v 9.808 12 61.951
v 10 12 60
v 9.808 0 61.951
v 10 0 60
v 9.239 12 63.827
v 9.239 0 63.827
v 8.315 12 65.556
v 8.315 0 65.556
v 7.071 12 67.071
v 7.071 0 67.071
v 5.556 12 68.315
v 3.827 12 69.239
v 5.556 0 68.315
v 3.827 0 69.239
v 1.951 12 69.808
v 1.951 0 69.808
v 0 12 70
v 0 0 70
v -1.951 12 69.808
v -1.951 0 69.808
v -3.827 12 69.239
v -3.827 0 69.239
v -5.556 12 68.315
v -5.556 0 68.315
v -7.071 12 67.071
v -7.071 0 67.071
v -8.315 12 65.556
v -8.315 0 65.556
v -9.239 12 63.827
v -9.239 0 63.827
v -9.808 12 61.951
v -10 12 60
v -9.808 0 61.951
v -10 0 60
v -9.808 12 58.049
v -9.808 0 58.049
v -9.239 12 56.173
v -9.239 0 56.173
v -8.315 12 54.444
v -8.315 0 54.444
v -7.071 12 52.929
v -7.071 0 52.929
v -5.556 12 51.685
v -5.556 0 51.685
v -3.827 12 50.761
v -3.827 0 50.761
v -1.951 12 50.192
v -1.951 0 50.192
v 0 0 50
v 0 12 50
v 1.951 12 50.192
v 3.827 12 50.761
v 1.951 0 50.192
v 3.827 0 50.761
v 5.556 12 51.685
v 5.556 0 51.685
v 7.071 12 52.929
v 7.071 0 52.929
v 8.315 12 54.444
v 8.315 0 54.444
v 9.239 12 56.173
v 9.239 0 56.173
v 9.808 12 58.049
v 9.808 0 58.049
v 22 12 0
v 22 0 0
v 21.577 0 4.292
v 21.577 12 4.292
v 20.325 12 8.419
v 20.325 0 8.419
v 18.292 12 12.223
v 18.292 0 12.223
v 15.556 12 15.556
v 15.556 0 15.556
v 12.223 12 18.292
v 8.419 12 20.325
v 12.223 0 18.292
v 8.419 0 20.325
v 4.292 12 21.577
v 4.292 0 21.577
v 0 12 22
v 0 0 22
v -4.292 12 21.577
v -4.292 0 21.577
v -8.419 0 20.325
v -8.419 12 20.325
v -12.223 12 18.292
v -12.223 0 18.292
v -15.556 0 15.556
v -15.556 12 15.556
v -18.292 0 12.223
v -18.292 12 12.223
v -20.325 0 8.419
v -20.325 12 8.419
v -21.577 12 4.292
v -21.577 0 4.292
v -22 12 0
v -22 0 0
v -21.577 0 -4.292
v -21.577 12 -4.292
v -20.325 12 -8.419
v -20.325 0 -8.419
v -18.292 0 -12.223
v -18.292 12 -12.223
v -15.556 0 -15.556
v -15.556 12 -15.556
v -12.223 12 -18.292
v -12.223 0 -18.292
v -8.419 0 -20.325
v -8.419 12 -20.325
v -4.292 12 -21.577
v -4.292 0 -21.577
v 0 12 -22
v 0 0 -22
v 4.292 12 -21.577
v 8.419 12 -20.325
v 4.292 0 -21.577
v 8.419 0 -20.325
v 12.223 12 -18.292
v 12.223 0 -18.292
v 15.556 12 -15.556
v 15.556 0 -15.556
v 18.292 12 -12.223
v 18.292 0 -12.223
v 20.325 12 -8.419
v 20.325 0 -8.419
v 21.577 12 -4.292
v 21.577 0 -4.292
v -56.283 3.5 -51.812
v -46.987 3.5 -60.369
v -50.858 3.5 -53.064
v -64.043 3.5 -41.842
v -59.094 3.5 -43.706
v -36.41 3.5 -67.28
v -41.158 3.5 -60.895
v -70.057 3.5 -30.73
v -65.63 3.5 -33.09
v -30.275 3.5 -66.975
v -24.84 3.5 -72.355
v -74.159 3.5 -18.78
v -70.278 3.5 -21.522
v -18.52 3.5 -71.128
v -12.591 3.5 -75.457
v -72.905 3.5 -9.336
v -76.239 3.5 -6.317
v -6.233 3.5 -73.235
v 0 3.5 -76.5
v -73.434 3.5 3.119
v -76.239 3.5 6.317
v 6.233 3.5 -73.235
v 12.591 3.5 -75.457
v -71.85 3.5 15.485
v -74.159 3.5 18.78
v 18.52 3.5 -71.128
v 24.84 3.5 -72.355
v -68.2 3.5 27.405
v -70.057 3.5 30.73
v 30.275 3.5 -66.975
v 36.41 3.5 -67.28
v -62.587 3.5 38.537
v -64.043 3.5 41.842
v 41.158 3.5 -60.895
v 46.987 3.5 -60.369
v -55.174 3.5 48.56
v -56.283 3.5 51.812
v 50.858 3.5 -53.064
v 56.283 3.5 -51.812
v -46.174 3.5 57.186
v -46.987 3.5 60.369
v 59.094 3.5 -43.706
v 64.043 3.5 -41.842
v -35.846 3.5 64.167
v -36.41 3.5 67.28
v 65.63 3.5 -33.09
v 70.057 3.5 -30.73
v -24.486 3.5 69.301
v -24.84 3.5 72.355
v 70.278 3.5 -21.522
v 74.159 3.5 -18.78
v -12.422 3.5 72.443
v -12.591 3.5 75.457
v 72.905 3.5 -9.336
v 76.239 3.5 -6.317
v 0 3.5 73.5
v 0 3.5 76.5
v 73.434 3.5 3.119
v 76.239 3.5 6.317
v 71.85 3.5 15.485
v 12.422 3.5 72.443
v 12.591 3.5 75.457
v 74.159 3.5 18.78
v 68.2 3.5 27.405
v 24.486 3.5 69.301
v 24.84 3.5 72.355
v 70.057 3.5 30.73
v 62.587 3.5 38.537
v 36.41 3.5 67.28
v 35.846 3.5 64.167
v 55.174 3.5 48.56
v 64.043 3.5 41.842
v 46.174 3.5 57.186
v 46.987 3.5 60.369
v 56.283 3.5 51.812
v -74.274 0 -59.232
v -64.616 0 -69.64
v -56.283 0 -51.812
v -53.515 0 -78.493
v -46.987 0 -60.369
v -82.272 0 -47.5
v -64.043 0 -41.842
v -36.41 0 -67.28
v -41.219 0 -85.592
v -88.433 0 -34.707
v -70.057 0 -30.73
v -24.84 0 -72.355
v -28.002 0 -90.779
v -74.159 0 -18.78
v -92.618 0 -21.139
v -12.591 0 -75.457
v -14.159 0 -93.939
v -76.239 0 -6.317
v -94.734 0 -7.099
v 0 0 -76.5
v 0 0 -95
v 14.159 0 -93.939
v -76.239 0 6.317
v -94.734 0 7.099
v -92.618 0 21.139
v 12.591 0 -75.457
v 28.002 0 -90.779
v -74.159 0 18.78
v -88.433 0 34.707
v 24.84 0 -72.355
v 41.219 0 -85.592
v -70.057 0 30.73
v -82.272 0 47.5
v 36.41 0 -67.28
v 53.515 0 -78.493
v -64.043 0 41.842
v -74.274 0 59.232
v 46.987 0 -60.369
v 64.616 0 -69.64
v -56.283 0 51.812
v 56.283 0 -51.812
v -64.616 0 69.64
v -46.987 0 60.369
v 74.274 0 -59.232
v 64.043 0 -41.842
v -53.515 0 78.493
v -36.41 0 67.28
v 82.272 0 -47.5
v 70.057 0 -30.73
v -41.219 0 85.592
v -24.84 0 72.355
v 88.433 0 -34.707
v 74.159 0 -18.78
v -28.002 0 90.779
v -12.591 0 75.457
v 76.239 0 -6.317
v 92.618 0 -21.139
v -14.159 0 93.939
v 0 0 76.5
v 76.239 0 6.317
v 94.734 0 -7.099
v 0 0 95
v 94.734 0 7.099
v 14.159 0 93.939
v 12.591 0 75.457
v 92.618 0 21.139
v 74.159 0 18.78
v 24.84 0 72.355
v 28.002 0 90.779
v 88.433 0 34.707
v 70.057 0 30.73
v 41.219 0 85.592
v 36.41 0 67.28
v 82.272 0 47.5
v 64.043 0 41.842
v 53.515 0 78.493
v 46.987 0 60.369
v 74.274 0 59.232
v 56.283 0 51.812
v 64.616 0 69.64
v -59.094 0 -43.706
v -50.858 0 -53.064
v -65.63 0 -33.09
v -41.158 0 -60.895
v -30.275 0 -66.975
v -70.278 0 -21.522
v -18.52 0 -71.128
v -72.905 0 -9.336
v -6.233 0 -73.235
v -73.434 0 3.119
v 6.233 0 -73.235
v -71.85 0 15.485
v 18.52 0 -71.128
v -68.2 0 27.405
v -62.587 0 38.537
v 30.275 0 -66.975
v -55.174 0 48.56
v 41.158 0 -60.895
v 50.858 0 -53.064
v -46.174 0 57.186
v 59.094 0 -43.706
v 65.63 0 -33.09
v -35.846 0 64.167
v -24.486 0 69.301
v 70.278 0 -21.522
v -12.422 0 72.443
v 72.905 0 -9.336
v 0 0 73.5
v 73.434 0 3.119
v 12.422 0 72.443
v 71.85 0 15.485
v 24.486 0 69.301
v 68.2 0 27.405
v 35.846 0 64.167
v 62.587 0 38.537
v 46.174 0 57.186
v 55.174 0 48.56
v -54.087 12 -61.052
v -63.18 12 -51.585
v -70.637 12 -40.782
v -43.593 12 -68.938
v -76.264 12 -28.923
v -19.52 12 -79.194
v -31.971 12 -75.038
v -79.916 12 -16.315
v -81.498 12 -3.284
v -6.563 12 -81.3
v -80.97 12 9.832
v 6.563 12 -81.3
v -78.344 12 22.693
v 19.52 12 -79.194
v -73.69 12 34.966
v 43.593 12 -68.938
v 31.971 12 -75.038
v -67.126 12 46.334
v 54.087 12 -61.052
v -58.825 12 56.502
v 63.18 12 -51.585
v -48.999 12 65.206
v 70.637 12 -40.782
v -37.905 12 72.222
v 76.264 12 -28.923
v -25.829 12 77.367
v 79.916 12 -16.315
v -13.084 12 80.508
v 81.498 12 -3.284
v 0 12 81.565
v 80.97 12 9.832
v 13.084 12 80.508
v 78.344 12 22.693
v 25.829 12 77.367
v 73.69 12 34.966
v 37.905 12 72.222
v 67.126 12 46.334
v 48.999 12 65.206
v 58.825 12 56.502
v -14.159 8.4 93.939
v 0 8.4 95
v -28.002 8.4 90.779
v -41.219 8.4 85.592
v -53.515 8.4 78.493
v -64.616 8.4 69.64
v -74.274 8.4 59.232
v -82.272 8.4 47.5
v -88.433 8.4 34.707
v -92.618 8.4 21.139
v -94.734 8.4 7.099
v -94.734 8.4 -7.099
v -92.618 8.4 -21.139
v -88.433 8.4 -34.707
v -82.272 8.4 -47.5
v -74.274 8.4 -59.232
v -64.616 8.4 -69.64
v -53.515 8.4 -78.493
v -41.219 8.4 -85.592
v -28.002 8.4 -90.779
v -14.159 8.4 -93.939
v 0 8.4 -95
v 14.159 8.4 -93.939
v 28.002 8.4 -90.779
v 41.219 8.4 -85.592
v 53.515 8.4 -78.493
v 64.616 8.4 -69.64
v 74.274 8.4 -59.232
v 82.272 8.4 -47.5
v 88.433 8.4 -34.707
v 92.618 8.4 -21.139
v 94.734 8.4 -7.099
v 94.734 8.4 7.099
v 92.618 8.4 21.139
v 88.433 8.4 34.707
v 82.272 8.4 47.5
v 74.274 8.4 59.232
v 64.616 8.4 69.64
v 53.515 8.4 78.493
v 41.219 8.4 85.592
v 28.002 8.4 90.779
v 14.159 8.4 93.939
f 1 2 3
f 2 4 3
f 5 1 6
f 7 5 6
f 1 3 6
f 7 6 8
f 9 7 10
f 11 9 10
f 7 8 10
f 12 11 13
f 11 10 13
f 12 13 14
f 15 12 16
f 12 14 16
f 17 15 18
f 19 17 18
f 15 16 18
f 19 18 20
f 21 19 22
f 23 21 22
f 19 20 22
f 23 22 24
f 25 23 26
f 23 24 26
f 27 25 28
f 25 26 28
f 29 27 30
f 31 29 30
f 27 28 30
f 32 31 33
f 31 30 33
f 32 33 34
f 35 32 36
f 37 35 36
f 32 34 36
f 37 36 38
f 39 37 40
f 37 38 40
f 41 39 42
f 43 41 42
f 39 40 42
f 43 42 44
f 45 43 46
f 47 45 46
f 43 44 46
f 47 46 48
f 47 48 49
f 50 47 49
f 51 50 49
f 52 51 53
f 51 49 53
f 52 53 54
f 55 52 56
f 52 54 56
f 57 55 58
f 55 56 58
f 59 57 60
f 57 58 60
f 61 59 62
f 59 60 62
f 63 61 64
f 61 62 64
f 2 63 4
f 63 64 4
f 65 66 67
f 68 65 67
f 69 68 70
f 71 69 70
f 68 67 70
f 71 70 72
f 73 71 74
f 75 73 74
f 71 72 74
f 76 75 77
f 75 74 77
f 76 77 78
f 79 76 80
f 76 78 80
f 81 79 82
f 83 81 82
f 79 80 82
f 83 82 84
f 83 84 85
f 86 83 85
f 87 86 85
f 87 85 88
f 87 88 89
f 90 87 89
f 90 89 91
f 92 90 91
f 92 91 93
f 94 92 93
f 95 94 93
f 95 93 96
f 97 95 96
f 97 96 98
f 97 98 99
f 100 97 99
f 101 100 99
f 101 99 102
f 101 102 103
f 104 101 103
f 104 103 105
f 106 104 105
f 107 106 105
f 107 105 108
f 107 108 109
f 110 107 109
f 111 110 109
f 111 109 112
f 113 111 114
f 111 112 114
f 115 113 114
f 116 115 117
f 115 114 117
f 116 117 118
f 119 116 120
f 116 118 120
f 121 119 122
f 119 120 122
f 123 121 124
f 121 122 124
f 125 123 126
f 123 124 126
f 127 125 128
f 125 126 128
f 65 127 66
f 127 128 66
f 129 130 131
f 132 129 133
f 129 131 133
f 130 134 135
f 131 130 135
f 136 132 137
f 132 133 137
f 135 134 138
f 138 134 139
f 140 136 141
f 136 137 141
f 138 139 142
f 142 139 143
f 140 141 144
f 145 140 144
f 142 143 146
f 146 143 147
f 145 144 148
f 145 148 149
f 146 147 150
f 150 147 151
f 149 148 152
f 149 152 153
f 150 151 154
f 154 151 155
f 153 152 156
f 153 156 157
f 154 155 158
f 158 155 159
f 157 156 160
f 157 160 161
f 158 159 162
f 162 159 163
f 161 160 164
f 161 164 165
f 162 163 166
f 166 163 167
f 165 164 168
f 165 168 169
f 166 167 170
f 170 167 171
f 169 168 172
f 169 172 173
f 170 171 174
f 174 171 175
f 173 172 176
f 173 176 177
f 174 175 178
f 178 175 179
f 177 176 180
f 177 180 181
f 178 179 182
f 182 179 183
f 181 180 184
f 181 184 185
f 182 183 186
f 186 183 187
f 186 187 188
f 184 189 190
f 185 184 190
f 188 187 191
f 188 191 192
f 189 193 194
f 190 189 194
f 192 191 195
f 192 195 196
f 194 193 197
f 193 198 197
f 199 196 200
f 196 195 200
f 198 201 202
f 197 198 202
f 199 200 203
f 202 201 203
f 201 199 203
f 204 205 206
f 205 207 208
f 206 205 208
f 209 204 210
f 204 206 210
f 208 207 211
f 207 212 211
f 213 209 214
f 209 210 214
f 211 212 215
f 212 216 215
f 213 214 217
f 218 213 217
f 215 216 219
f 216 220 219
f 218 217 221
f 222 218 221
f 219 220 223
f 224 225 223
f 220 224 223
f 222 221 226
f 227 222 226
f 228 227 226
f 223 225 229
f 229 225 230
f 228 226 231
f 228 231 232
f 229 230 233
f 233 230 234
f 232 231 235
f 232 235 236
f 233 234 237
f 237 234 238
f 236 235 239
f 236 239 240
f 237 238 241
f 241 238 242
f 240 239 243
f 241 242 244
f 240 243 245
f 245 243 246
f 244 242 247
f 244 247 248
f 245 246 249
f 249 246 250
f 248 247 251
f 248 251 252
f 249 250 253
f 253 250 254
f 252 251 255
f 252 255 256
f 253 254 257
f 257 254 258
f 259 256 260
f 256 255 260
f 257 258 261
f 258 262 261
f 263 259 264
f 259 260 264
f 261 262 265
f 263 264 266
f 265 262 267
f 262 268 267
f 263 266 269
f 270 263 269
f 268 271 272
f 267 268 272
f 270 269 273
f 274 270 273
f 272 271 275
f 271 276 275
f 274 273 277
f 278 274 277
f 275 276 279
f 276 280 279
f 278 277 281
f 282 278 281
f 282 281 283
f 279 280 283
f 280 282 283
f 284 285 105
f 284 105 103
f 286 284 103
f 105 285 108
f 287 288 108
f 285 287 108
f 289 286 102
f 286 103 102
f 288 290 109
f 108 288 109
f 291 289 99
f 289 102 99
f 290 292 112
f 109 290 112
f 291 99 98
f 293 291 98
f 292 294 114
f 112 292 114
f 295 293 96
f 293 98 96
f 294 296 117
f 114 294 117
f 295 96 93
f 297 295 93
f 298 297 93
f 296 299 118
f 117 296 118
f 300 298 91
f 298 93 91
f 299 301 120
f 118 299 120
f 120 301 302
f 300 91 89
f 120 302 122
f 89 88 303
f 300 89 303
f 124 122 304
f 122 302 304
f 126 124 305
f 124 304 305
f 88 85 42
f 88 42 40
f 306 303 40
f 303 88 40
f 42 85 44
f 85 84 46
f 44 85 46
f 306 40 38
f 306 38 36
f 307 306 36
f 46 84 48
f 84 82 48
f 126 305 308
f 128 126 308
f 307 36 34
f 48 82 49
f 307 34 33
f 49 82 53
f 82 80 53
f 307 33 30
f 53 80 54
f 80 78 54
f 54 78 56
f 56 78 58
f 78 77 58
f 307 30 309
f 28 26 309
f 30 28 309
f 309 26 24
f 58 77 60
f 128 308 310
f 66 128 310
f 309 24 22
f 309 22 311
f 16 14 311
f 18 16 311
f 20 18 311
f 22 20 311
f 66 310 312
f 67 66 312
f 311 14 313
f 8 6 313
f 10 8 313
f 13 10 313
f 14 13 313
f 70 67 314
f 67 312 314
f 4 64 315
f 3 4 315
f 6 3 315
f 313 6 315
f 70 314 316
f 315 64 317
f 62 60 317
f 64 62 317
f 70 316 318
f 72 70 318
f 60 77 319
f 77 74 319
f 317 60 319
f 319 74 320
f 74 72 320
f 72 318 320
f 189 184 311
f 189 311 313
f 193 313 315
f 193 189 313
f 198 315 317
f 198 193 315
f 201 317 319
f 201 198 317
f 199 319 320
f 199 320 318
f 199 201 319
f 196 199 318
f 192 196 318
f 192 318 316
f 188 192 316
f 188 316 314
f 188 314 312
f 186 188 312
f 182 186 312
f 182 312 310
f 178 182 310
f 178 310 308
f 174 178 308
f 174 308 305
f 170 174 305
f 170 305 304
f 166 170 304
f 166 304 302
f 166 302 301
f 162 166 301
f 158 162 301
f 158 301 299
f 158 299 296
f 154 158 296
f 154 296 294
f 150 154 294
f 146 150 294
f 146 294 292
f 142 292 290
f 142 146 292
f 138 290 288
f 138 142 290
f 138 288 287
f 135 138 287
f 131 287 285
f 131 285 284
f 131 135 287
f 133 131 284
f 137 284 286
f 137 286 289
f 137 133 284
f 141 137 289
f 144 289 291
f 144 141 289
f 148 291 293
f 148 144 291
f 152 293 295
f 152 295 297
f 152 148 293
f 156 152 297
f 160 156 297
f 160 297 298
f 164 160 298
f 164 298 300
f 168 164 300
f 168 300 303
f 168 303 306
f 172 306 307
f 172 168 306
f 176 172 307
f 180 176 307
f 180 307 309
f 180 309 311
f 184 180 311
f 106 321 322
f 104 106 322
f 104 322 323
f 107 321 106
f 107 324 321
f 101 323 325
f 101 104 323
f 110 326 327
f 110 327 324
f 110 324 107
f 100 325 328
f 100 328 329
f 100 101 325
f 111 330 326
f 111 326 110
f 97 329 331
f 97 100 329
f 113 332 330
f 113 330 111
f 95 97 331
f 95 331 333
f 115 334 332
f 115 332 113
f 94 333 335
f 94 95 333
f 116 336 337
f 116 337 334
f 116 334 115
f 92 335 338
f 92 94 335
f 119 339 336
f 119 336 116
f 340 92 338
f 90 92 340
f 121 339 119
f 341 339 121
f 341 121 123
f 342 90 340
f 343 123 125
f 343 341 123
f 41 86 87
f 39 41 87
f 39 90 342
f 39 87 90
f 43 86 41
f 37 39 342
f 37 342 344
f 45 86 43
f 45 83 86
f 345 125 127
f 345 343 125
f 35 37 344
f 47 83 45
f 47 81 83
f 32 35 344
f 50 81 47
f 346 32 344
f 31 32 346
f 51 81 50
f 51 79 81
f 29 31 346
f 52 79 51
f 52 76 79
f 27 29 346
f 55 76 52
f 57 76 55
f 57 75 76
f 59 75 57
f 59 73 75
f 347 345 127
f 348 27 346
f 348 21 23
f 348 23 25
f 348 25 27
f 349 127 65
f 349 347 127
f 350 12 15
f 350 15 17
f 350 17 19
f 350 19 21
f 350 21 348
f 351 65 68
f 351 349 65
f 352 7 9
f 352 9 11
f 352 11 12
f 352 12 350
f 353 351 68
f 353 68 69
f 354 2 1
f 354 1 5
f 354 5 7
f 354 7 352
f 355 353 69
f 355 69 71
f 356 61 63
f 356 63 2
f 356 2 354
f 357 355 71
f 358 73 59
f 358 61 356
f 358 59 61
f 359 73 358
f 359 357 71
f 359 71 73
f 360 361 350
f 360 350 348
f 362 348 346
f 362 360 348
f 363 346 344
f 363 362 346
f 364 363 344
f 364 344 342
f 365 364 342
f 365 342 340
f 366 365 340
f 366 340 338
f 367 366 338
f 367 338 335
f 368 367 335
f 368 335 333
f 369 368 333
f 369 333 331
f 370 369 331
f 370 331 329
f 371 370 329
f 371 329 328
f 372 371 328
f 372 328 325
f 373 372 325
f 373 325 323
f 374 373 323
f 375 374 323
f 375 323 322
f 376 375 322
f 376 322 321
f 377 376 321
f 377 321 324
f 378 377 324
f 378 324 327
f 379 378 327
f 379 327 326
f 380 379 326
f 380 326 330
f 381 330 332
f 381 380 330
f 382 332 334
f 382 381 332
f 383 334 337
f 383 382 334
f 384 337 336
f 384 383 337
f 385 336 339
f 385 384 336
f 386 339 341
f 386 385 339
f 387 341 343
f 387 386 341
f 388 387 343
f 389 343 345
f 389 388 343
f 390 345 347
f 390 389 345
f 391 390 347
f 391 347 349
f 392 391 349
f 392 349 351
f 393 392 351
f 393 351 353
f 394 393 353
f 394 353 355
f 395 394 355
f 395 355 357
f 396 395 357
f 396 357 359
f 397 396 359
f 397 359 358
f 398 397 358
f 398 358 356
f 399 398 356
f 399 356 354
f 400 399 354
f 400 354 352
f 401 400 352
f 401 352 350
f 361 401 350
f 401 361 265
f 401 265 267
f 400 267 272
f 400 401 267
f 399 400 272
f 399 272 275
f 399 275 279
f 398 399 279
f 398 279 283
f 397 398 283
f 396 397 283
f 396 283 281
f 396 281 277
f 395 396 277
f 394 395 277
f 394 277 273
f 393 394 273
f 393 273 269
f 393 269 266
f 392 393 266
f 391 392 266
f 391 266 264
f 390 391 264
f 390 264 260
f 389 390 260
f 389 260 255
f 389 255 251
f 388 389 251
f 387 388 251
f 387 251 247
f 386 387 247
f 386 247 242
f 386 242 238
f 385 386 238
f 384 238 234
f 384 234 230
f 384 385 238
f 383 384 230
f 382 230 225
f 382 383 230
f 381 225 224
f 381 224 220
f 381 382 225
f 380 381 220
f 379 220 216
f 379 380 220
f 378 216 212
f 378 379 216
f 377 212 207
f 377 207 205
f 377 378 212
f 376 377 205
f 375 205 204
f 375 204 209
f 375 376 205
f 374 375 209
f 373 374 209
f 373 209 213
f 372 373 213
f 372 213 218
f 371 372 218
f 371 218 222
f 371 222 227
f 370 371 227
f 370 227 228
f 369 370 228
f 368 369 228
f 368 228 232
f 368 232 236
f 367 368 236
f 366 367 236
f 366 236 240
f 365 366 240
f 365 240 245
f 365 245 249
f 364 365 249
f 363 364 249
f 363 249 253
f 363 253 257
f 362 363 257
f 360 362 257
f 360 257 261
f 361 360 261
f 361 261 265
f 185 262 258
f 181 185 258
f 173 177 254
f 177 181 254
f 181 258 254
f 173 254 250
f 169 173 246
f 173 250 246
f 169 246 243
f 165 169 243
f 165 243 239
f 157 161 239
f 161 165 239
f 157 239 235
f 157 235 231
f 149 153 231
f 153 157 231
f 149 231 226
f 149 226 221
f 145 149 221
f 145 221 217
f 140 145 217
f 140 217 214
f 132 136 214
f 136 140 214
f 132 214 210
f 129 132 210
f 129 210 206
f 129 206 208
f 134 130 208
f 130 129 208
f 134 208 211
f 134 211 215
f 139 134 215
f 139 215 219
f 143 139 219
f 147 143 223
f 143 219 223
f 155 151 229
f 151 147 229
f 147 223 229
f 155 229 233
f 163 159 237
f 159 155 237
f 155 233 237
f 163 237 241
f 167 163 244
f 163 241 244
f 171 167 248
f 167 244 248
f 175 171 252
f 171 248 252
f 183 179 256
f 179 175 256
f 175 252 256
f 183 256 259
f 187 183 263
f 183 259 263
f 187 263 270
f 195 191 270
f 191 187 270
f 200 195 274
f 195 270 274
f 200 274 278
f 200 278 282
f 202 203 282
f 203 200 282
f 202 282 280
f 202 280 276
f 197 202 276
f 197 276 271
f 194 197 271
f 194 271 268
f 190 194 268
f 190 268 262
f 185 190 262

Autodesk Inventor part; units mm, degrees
ref_plane "YZ Plane" through (0, 0, 0) normal (1, 0, 0) x (0, 1, 0)
ref_plane "XZ Plane" through (0, 0, 0) normal (0, 1, 0) x (-1, 0, 0)
ref_plane "XY Plane" through (0, 0, 0) normal (0, 0, 1) x (1, 0, 0)
sketch "Sketch1" plane through (0, 0, 0) normal (1, 0, 0) x (0, 1, 0)
  line L0 (0, 95) -> (8.4, 95)
  line L1 (8.4, 95) -> (12, 81.5646)
  line L2 (12, 81.5646) -> (12, 0)
  line L3 (12, 0) -> (0, 0)
  line L4 (0, 0) -> (0, 73.5)
  line L5 (0, 73.5) -> (3.5, 73.5)
  line L6 (3.5, 73.5) -> (3.5, 76.5)
  line L7 (3.5, 76.5) -> (0, 76.5)
  line L8 (0, 76.5) -> (0, 95)
  line L9 (0, 114) -> (0, -19) construction
  line L10 (-2.4, 0) -> (14.4, 0) projected
  dimension "d0" = 95
  dimension "d1" = 12
  dimension "d2" = 8.4
  dimension "d3" = 3.5
  dimension "d4" = 3
  dimension "d5" = 73.5
  dimension "d6" = 165
revolve "Revolution1" add sketch "Sketch1" angle 360 about axis through (0, -10, 0) along (0, 1, 0)
sketch "Sketch2" plane through (0, 0, 0) normal (0, -1, 0) x (1, 0, 0)
  circle A0 centre (0, 0) radius 81.5646 projected
  circle A1 centre (0, 0) radius 22
  circle A2 centre (0, 60) radius 10
  dimension "d8" = 44
  dimension "d9" = 20
  dimension "d10" = 60
extrude "Extrusion1" cut sketch "Sketch2" against normal through all contours A1 | A2
properties part number "top_flange"
